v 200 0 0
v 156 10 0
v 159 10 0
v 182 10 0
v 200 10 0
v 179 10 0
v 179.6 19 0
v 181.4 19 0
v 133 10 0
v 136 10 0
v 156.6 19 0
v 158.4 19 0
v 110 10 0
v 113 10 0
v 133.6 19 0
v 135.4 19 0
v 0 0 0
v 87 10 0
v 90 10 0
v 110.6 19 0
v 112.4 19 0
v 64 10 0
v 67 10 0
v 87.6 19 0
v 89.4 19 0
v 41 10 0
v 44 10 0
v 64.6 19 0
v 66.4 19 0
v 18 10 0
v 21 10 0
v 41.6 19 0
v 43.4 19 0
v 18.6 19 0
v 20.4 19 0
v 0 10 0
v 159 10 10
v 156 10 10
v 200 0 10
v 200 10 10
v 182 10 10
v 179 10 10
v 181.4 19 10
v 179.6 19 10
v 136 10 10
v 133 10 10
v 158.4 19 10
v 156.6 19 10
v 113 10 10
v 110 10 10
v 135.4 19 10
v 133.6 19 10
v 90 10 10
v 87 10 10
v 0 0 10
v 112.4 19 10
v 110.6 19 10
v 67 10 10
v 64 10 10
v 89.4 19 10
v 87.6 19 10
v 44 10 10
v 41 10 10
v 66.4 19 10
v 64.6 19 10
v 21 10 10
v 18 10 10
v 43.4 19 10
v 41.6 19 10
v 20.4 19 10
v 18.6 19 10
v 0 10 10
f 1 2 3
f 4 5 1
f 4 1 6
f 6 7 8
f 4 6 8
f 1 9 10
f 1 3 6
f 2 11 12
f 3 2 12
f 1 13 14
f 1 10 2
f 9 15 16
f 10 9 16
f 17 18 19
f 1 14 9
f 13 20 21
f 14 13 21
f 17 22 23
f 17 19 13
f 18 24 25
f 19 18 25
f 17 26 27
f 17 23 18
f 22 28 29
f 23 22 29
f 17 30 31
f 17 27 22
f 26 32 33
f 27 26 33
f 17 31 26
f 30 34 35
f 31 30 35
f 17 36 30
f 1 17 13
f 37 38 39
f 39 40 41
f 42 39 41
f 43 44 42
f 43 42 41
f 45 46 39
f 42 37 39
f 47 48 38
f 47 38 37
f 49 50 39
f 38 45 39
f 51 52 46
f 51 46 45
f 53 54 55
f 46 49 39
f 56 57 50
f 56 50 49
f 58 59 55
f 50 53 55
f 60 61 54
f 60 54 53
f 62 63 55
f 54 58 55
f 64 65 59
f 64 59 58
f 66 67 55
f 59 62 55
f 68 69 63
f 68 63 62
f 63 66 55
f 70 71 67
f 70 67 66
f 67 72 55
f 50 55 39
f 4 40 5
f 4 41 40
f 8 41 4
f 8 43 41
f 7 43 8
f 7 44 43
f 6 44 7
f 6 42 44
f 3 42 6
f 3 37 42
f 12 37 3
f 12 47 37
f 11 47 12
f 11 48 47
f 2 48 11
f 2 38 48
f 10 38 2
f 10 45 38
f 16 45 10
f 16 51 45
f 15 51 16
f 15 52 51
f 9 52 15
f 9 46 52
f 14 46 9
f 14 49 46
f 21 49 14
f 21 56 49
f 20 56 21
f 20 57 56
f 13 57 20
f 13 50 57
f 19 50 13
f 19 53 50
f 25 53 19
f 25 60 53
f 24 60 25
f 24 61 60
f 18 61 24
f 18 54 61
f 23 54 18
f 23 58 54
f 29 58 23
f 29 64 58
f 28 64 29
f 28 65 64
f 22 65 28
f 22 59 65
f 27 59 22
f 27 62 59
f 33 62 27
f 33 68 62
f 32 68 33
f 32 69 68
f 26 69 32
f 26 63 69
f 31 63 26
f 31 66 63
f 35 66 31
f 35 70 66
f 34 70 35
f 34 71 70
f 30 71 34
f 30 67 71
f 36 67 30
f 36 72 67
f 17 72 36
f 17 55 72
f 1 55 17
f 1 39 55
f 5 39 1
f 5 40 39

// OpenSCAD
$fn = 32;

// ----------------------------------------------------------------------
// Gear rack: 8 teeth on a 200 mm bar, pitch 23 mm
// ----------------------------------------------------------------------

// --- parameters (mm) ---
profile_height = 10;      // extrusion height
profile_points = 36;      // points of the closed outline

profile = [[0, 0], [200, 0], [200, 10], [182, 10], [181.4, 19], [179.6, 19], [179, 10], [159, 10], [158.4, 19], [156.6, 19], [156, 10], [136, 10], [135.4, 19], [133.6, 19], [133, 10], [113, 10], [112.4, 19], [110.6, 19], [110, 10], [90, 10], [89.4, 19], [87.6, 19], [87, 10], [67, 10], [66.4, 19], [64.6, 19], [64, 10], [44, 10], [43.4, 19], [41.6, 19], [41, 10], [21, 10], [20.4, 19], [18.6, 19], [18, 10], [0, 10]];  // single closed polygon, 36 points, counter clockwise

// --- the one profile operation ---
linear_extrude(height = profile_height) polygon(points = profile);
